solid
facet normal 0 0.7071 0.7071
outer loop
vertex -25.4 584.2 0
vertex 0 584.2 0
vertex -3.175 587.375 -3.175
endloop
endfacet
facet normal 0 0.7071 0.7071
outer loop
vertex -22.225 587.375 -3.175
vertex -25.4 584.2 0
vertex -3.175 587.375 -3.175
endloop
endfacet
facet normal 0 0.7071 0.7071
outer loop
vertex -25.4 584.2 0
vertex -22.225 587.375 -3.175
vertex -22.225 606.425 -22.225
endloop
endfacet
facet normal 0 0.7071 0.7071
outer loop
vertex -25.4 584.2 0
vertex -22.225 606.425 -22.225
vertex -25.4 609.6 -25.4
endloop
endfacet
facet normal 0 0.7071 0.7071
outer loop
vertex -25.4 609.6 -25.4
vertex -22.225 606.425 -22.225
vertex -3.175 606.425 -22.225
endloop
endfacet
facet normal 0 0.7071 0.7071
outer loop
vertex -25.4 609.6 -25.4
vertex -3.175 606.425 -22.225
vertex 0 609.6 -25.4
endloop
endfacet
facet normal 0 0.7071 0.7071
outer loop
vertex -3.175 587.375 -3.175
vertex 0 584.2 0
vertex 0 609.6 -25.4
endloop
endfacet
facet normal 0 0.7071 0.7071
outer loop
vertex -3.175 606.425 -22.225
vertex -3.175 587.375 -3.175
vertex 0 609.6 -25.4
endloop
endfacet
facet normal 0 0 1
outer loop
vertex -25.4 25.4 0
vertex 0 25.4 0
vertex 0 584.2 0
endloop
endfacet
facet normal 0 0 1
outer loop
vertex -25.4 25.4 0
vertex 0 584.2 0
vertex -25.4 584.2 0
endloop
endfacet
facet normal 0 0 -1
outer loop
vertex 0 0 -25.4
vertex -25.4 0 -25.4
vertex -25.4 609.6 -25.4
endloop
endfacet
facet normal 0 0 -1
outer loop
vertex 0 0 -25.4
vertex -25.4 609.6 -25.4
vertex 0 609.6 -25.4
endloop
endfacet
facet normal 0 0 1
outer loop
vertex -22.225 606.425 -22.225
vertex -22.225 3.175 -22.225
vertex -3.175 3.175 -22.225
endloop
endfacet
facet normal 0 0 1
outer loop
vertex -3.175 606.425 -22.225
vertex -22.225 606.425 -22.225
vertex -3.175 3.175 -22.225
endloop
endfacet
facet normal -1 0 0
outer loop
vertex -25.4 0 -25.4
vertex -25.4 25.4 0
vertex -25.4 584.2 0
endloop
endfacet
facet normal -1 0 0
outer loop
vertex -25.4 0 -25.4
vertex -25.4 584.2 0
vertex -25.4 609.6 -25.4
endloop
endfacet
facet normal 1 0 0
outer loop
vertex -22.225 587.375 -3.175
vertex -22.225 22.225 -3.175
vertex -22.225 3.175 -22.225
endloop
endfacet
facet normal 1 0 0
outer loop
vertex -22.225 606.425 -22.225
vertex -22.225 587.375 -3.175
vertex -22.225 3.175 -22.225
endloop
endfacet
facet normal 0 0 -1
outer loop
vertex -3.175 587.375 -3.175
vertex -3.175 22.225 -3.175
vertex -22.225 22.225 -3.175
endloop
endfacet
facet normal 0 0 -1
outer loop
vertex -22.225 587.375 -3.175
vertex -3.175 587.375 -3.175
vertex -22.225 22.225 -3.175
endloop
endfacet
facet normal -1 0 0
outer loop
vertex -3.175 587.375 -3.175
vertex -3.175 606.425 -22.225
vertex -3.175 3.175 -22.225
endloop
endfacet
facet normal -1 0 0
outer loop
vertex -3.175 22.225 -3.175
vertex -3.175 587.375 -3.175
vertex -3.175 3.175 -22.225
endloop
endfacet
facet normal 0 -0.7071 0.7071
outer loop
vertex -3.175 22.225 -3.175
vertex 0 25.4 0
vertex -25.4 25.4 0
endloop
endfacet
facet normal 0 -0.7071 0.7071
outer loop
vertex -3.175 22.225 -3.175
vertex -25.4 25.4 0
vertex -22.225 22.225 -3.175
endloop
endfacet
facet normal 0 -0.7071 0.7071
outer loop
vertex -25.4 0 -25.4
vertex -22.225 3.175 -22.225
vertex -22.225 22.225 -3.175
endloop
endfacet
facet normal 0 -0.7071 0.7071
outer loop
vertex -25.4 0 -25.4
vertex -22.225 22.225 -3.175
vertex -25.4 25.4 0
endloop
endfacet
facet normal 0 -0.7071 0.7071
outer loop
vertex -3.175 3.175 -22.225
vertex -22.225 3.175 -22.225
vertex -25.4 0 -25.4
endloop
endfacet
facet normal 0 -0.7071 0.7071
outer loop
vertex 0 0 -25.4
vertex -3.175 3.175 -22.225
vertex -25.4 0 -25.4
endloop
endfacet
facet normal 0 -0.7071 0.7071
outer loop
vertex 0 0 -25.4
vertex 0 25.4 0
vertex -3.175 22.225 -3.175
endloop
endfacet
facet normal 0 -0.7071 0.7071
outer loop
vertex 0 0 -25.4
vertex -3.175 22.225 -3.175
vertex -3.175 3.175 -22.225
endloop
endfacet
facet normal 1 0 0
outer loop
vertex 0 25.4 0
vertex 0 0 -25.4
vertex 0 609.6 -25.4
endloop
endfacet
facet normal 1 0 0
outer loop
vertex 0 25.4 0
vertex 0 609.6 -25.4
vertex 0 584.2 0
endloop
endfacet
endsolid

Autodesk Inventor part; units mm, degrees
ref_plane "YZ Plane" through (0, 0, 0) normal (1, 0, 0) x (0, 1, 0)
ref_plane "XZ Plane" through (0, 0, 0) normal (0, 1, 0) x (-1, 0, 0)
ref_plane "XY Plane" through (0, 0, 0) normal (0, 0, 1) x (1, 0, 0)
sketch "Sketch1" plane through (0, 0, 0) normal (0, 1, 0) x (-1, 0, 0)
  line L0 (0, 0) -> (25.4, 0)
  line L1 (25.4, 0) -> (25.4, -25.4)
  line L2 (25.4, -25.4) -> (0, -25.4)
  line L3 (0, -25.4) -> (0, 0)
  line L4 (3.175, -3.175) -> (22.225, -3.175)
  line L5 (22.225, -3.175) -> (22.225, -22.225)
  line L6 (22.225, -22.225) -> (3.175, -22.225)
  line L7 (3.175, -22.225) -> (3.175, -3.175)
  dimension "d0" = 25.4
  dimension "d1" = 25.4
  dimension "d2" = 3.175
extrude "Extrusion1" add sketch "Sketch1" along normal blind 609.6
chamfer "Chamfer1" distance 25.4 angle 45 2 edges at (-12.7, 609.6, 0) (-12.7, 0, 0)
properties part number "1x1x24"
